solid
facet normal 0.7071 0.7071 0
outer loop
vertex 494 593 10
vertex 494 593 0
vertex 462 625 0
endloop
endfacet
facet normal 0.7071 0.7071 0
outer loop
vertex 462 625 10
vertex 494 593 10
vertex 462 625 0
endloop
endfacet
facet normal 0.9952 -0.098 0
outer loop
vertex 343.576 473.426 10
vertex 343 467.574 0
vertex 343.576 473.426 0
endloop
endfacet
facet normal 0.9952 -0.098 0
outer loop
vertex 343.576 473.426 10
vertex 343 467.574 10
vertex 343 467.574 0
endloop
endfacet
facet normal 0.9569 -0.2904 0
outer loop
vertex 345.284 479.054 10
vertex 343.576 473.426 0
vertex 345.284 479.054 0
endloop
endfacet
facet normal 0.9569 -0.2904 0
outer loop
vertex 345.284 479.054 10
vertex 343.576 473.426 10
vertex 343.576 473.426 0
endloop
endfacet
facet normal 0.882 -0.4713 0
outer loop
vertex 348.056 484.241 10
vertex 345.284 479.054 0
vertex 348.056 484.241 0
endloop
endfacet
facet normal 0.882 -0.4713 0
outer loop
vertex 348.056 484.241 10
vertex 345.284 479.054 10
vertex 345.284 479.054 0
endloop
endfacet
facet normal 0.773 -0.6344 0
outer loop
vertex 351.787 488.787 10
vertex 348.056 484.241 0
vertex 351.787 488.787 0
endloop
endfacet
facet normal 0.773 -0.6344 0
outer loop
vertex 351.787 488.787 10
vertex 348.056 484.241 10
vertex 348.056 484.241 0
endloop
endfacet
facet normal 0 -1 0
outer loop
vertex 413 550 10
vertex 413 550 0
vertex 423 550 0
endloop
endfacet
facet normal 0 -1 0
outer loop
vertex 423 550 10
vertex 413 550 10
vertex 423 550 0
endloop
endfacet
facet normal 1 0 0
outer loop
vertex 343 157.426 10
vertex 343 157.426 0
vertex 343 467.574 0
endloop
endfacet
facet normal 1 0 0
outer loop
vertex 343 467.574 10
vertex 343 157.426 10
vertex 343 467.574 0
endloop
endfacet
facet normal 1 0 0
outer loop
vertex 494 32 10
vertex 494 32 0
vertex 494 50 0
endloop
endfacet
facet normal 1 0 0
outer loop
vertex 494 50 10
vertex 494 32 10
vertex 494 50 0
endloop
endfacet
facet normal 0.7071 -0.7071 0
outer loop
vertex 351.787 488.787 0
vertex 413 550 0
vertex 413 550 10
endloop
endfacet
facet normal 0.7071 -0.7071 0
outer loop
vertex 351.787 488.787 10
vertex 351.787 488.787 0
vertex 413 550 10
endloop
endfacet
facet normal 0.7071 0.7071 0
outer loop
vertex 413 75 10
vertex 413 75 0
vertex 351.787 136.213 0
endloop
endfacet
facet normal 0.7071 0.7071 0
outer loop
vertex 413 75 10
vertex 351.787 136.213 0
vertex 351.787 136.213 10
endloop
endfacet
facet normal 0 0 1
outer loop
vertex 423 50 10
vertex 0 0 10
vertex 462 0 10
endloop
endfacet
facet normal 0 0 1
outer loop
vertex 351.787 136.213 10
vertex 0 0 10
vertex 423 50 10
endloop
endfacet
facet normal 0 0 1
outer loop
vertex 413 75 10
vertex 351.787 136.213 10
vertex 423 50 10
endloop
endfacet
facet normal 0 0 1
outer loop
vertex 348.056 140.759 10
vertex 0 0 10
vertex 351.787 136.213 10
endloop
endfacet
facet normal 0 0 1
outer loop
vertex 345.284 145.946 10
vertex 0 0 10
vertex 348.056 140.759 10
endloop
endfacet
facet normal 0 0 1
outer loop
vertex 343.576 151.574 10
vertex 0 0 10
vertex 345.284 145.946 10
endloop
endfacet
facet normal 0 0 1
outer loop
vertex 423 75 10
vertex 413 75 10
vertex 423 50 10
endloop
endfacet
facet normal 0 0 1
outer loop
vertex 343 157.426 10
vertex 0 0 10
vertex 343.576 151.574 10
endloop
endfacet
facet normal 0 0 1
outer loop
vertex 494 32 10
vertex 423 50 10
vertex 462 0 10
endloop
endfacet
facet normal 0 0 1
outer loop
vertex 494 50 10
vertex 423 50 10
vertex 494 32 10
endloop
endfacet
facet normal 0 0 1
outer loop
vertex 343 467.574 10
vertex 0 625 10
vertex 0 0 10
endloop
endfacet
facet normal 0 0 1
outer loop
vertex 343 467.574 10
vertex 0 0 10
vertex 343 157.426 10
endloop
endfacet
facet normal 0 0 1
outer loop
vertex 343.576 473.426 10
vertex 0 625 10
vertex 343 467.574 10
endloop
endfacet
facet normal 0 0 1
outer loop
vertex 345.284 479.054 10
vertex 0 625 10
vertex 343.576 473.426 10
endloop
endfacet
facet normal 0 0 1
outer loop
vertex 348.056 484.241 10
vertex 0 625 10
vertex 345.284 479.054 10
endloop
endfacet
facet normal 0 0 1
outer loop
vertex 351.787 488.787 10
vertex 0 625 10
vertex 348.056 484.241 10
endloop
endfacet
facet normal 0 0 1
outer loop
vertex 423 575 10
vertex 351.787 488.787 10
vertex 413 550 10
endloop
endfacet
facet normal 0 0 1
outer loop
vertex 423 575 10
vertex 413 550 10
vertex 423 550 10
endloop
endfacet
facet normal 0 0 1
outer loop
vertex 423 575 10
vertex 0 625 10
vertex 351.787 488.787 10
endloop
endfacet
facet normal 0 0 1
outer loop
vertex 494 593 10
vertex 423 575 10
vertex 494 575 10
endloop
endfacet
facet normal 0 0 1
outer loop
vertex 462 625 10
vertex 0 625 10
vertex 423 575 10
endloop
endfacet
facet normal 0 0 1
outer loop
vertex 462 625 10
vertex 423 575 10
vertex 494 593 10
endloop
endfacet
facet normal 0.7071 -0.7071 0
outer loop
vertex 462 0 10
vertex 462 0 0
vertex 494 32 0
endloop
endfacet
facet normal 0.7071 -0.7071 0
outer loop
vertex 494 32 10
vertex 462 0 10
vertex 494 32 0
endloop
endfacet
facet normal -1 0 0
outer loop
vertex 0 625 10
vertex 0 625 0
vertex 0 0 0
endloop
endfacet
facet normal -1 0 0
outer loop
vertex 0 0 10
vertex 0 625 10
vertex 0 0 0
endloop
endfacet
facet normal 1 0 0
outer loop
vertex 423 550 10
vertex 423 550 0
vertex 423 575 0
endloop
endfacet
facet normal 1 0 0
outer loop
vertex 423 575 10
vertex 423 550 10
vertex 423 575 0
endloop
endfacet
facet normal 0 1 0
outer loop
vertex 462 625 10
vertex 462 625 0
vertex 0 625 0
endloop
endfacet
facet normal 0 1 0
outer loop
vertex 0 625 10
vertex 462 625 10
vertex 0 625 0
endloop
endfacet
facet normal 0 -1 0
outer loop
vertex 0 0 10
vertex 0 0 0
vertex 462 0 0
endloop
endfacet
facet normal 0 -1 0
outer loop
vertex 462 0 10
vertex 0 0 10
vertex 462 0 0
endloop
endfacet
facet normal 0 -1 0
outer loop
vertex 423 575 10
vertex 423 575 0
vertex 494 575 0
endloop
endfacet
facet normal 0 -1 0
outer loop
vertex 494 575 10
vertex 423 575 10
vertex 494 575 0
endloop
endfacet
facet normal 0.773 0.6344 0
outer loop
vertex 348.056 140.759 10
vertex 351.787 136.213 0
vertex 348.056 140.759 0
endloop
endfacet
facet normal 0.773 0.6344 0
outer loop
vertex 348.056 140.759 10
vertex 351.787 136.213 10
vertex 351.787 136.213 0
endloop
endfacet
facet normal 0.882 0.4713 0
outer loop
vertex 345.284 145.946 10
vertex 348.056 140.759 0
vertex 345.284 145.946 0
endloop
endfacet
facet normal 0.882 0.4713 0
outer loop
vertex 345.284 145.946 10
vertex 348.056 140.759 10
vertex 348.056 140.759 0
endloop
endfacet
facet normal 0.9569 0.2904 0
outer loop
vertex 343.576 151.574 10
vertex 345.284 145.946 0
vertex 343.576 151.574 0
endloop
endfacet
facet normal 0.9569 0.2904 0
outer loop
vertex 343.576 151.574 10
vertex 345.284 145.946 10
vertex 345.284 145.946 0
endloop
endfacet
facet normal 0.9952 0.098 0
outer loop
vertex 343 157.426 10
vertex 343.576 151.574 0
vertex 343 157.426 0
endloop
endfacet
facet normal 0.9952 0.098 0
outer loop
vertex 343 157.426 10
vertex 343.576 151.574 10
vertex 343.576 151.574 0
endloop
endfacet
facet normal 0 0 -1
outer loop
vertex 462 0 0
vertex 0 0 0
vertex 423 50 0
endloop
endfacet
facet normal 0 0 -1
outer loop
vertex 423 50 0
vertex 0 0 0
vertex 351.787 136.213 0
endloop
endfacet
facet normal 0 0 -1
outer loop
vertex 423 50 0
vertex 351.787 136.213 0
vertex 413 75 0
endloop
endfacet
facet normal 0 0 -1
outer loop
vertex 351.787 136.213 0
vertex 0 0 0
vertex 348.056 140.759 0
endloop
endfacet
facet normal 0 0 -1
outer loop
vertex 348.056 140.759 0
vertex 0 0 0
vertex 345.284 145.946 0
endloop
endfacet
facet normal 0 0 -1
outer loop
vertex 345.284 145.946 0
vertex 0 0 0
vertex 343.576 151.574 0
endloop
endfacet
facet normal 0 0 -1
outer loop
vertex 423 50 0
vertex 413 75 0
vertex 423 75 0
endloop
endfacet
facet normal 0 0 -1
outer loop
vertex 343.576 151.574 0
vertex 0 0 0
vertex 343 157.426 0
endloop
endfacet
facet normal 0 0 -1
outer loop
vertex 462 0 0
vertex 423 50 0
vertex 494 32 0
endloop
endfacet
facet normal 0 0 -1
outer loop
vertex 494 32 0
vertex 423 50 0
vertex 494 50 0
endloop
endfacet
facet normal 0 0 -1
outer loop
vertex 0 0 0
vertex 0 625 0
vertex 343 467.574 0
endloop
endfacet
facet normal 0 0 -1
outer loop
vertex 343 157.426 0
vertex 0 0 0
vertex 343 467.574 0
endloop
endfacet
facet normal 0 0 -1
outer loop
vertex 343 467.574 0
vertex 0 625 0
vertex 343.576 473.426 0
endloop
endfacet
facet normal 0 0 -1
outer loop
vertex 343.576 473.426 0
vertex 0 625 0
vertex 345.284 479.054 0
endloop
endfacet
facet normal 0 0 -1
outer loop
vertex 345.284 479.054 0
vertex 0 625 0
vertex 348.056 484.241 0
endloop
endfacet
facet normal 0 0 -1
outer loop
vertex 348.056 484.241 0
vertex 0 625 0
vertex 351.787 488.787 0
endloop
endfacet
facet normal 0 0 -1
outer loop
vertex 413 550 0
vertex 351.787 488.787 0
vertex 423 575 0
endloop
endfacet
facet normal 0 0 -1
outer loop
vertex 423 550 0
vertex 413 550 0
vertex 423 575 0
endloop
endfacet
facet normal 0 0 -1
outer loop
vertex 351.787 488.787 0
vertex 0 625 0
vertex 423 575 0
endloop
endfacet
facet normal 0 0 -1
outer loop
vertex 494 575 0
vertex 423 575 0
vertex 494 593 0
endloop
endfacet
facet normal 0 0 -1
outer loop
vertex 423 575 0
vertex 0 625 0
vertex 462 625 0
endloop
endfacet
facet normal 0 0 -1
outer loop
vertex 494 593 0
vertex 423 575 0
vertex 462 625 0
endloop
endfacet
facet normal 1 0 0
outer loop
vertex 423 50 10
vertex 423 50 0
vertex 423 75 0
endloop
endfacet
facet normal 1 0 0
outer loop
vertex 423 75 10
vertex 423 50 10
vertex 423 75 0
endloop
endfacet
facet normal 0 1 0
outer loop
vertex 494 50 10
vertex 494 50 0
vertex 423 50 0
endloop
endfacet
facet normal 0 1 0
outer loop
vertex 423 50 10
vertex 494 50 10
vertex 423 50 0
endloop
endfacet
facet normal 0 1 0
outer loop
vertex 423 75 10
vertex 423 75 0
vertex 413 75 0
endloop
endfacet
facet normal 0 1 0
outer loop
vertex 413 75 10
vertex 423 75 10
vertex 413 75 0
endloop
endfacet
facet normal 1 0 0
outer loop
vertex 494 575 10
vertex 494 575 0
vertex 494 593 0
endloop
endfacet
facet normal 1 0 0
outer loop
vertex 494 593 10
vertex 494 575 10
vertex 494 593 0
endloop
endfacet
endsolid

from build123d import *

# Parameters (mm, degrees)
RESSALTO_EXTRUS_O1_DEPTH = 10
CHANFRO1_SIZE            = 70
FILETE1_R                = 30


with BuildPart() as part:
    # Esboço1 → Ressalto-extrusão1 (new body)
    with BuildSketch(Plane.XY):
        Polygon((423, 50), (423, 75), (343, 75), (343, 550), (423, 550), (423, 575), (494, 575), (494, 593), (462, 625), (0, 625), (0, 0), (462, 0), (494, 32), (494, 50), align=None)
    extrude(amount=RESSALTO_EXTRUS_O1_DEPTH)

    # Chanfro1
    chanfro1_edges = [part.edges().sort_by_distance(p)[0] for p in [
        (343, 550, 5),
        (343, 75, 5),
    ]]
    chamfer(chanfro1_edges, length=CHANFRO1_SIZE)

    # Filete1
    filete1_edges = [part.edges().sort_by_distance(p)[0] for p in [
        (343, 145, 5),
        (343, 480, 5),
    ]]
    fillet(filete1_edges, radius=FILETE1_R)


solid = part.part
